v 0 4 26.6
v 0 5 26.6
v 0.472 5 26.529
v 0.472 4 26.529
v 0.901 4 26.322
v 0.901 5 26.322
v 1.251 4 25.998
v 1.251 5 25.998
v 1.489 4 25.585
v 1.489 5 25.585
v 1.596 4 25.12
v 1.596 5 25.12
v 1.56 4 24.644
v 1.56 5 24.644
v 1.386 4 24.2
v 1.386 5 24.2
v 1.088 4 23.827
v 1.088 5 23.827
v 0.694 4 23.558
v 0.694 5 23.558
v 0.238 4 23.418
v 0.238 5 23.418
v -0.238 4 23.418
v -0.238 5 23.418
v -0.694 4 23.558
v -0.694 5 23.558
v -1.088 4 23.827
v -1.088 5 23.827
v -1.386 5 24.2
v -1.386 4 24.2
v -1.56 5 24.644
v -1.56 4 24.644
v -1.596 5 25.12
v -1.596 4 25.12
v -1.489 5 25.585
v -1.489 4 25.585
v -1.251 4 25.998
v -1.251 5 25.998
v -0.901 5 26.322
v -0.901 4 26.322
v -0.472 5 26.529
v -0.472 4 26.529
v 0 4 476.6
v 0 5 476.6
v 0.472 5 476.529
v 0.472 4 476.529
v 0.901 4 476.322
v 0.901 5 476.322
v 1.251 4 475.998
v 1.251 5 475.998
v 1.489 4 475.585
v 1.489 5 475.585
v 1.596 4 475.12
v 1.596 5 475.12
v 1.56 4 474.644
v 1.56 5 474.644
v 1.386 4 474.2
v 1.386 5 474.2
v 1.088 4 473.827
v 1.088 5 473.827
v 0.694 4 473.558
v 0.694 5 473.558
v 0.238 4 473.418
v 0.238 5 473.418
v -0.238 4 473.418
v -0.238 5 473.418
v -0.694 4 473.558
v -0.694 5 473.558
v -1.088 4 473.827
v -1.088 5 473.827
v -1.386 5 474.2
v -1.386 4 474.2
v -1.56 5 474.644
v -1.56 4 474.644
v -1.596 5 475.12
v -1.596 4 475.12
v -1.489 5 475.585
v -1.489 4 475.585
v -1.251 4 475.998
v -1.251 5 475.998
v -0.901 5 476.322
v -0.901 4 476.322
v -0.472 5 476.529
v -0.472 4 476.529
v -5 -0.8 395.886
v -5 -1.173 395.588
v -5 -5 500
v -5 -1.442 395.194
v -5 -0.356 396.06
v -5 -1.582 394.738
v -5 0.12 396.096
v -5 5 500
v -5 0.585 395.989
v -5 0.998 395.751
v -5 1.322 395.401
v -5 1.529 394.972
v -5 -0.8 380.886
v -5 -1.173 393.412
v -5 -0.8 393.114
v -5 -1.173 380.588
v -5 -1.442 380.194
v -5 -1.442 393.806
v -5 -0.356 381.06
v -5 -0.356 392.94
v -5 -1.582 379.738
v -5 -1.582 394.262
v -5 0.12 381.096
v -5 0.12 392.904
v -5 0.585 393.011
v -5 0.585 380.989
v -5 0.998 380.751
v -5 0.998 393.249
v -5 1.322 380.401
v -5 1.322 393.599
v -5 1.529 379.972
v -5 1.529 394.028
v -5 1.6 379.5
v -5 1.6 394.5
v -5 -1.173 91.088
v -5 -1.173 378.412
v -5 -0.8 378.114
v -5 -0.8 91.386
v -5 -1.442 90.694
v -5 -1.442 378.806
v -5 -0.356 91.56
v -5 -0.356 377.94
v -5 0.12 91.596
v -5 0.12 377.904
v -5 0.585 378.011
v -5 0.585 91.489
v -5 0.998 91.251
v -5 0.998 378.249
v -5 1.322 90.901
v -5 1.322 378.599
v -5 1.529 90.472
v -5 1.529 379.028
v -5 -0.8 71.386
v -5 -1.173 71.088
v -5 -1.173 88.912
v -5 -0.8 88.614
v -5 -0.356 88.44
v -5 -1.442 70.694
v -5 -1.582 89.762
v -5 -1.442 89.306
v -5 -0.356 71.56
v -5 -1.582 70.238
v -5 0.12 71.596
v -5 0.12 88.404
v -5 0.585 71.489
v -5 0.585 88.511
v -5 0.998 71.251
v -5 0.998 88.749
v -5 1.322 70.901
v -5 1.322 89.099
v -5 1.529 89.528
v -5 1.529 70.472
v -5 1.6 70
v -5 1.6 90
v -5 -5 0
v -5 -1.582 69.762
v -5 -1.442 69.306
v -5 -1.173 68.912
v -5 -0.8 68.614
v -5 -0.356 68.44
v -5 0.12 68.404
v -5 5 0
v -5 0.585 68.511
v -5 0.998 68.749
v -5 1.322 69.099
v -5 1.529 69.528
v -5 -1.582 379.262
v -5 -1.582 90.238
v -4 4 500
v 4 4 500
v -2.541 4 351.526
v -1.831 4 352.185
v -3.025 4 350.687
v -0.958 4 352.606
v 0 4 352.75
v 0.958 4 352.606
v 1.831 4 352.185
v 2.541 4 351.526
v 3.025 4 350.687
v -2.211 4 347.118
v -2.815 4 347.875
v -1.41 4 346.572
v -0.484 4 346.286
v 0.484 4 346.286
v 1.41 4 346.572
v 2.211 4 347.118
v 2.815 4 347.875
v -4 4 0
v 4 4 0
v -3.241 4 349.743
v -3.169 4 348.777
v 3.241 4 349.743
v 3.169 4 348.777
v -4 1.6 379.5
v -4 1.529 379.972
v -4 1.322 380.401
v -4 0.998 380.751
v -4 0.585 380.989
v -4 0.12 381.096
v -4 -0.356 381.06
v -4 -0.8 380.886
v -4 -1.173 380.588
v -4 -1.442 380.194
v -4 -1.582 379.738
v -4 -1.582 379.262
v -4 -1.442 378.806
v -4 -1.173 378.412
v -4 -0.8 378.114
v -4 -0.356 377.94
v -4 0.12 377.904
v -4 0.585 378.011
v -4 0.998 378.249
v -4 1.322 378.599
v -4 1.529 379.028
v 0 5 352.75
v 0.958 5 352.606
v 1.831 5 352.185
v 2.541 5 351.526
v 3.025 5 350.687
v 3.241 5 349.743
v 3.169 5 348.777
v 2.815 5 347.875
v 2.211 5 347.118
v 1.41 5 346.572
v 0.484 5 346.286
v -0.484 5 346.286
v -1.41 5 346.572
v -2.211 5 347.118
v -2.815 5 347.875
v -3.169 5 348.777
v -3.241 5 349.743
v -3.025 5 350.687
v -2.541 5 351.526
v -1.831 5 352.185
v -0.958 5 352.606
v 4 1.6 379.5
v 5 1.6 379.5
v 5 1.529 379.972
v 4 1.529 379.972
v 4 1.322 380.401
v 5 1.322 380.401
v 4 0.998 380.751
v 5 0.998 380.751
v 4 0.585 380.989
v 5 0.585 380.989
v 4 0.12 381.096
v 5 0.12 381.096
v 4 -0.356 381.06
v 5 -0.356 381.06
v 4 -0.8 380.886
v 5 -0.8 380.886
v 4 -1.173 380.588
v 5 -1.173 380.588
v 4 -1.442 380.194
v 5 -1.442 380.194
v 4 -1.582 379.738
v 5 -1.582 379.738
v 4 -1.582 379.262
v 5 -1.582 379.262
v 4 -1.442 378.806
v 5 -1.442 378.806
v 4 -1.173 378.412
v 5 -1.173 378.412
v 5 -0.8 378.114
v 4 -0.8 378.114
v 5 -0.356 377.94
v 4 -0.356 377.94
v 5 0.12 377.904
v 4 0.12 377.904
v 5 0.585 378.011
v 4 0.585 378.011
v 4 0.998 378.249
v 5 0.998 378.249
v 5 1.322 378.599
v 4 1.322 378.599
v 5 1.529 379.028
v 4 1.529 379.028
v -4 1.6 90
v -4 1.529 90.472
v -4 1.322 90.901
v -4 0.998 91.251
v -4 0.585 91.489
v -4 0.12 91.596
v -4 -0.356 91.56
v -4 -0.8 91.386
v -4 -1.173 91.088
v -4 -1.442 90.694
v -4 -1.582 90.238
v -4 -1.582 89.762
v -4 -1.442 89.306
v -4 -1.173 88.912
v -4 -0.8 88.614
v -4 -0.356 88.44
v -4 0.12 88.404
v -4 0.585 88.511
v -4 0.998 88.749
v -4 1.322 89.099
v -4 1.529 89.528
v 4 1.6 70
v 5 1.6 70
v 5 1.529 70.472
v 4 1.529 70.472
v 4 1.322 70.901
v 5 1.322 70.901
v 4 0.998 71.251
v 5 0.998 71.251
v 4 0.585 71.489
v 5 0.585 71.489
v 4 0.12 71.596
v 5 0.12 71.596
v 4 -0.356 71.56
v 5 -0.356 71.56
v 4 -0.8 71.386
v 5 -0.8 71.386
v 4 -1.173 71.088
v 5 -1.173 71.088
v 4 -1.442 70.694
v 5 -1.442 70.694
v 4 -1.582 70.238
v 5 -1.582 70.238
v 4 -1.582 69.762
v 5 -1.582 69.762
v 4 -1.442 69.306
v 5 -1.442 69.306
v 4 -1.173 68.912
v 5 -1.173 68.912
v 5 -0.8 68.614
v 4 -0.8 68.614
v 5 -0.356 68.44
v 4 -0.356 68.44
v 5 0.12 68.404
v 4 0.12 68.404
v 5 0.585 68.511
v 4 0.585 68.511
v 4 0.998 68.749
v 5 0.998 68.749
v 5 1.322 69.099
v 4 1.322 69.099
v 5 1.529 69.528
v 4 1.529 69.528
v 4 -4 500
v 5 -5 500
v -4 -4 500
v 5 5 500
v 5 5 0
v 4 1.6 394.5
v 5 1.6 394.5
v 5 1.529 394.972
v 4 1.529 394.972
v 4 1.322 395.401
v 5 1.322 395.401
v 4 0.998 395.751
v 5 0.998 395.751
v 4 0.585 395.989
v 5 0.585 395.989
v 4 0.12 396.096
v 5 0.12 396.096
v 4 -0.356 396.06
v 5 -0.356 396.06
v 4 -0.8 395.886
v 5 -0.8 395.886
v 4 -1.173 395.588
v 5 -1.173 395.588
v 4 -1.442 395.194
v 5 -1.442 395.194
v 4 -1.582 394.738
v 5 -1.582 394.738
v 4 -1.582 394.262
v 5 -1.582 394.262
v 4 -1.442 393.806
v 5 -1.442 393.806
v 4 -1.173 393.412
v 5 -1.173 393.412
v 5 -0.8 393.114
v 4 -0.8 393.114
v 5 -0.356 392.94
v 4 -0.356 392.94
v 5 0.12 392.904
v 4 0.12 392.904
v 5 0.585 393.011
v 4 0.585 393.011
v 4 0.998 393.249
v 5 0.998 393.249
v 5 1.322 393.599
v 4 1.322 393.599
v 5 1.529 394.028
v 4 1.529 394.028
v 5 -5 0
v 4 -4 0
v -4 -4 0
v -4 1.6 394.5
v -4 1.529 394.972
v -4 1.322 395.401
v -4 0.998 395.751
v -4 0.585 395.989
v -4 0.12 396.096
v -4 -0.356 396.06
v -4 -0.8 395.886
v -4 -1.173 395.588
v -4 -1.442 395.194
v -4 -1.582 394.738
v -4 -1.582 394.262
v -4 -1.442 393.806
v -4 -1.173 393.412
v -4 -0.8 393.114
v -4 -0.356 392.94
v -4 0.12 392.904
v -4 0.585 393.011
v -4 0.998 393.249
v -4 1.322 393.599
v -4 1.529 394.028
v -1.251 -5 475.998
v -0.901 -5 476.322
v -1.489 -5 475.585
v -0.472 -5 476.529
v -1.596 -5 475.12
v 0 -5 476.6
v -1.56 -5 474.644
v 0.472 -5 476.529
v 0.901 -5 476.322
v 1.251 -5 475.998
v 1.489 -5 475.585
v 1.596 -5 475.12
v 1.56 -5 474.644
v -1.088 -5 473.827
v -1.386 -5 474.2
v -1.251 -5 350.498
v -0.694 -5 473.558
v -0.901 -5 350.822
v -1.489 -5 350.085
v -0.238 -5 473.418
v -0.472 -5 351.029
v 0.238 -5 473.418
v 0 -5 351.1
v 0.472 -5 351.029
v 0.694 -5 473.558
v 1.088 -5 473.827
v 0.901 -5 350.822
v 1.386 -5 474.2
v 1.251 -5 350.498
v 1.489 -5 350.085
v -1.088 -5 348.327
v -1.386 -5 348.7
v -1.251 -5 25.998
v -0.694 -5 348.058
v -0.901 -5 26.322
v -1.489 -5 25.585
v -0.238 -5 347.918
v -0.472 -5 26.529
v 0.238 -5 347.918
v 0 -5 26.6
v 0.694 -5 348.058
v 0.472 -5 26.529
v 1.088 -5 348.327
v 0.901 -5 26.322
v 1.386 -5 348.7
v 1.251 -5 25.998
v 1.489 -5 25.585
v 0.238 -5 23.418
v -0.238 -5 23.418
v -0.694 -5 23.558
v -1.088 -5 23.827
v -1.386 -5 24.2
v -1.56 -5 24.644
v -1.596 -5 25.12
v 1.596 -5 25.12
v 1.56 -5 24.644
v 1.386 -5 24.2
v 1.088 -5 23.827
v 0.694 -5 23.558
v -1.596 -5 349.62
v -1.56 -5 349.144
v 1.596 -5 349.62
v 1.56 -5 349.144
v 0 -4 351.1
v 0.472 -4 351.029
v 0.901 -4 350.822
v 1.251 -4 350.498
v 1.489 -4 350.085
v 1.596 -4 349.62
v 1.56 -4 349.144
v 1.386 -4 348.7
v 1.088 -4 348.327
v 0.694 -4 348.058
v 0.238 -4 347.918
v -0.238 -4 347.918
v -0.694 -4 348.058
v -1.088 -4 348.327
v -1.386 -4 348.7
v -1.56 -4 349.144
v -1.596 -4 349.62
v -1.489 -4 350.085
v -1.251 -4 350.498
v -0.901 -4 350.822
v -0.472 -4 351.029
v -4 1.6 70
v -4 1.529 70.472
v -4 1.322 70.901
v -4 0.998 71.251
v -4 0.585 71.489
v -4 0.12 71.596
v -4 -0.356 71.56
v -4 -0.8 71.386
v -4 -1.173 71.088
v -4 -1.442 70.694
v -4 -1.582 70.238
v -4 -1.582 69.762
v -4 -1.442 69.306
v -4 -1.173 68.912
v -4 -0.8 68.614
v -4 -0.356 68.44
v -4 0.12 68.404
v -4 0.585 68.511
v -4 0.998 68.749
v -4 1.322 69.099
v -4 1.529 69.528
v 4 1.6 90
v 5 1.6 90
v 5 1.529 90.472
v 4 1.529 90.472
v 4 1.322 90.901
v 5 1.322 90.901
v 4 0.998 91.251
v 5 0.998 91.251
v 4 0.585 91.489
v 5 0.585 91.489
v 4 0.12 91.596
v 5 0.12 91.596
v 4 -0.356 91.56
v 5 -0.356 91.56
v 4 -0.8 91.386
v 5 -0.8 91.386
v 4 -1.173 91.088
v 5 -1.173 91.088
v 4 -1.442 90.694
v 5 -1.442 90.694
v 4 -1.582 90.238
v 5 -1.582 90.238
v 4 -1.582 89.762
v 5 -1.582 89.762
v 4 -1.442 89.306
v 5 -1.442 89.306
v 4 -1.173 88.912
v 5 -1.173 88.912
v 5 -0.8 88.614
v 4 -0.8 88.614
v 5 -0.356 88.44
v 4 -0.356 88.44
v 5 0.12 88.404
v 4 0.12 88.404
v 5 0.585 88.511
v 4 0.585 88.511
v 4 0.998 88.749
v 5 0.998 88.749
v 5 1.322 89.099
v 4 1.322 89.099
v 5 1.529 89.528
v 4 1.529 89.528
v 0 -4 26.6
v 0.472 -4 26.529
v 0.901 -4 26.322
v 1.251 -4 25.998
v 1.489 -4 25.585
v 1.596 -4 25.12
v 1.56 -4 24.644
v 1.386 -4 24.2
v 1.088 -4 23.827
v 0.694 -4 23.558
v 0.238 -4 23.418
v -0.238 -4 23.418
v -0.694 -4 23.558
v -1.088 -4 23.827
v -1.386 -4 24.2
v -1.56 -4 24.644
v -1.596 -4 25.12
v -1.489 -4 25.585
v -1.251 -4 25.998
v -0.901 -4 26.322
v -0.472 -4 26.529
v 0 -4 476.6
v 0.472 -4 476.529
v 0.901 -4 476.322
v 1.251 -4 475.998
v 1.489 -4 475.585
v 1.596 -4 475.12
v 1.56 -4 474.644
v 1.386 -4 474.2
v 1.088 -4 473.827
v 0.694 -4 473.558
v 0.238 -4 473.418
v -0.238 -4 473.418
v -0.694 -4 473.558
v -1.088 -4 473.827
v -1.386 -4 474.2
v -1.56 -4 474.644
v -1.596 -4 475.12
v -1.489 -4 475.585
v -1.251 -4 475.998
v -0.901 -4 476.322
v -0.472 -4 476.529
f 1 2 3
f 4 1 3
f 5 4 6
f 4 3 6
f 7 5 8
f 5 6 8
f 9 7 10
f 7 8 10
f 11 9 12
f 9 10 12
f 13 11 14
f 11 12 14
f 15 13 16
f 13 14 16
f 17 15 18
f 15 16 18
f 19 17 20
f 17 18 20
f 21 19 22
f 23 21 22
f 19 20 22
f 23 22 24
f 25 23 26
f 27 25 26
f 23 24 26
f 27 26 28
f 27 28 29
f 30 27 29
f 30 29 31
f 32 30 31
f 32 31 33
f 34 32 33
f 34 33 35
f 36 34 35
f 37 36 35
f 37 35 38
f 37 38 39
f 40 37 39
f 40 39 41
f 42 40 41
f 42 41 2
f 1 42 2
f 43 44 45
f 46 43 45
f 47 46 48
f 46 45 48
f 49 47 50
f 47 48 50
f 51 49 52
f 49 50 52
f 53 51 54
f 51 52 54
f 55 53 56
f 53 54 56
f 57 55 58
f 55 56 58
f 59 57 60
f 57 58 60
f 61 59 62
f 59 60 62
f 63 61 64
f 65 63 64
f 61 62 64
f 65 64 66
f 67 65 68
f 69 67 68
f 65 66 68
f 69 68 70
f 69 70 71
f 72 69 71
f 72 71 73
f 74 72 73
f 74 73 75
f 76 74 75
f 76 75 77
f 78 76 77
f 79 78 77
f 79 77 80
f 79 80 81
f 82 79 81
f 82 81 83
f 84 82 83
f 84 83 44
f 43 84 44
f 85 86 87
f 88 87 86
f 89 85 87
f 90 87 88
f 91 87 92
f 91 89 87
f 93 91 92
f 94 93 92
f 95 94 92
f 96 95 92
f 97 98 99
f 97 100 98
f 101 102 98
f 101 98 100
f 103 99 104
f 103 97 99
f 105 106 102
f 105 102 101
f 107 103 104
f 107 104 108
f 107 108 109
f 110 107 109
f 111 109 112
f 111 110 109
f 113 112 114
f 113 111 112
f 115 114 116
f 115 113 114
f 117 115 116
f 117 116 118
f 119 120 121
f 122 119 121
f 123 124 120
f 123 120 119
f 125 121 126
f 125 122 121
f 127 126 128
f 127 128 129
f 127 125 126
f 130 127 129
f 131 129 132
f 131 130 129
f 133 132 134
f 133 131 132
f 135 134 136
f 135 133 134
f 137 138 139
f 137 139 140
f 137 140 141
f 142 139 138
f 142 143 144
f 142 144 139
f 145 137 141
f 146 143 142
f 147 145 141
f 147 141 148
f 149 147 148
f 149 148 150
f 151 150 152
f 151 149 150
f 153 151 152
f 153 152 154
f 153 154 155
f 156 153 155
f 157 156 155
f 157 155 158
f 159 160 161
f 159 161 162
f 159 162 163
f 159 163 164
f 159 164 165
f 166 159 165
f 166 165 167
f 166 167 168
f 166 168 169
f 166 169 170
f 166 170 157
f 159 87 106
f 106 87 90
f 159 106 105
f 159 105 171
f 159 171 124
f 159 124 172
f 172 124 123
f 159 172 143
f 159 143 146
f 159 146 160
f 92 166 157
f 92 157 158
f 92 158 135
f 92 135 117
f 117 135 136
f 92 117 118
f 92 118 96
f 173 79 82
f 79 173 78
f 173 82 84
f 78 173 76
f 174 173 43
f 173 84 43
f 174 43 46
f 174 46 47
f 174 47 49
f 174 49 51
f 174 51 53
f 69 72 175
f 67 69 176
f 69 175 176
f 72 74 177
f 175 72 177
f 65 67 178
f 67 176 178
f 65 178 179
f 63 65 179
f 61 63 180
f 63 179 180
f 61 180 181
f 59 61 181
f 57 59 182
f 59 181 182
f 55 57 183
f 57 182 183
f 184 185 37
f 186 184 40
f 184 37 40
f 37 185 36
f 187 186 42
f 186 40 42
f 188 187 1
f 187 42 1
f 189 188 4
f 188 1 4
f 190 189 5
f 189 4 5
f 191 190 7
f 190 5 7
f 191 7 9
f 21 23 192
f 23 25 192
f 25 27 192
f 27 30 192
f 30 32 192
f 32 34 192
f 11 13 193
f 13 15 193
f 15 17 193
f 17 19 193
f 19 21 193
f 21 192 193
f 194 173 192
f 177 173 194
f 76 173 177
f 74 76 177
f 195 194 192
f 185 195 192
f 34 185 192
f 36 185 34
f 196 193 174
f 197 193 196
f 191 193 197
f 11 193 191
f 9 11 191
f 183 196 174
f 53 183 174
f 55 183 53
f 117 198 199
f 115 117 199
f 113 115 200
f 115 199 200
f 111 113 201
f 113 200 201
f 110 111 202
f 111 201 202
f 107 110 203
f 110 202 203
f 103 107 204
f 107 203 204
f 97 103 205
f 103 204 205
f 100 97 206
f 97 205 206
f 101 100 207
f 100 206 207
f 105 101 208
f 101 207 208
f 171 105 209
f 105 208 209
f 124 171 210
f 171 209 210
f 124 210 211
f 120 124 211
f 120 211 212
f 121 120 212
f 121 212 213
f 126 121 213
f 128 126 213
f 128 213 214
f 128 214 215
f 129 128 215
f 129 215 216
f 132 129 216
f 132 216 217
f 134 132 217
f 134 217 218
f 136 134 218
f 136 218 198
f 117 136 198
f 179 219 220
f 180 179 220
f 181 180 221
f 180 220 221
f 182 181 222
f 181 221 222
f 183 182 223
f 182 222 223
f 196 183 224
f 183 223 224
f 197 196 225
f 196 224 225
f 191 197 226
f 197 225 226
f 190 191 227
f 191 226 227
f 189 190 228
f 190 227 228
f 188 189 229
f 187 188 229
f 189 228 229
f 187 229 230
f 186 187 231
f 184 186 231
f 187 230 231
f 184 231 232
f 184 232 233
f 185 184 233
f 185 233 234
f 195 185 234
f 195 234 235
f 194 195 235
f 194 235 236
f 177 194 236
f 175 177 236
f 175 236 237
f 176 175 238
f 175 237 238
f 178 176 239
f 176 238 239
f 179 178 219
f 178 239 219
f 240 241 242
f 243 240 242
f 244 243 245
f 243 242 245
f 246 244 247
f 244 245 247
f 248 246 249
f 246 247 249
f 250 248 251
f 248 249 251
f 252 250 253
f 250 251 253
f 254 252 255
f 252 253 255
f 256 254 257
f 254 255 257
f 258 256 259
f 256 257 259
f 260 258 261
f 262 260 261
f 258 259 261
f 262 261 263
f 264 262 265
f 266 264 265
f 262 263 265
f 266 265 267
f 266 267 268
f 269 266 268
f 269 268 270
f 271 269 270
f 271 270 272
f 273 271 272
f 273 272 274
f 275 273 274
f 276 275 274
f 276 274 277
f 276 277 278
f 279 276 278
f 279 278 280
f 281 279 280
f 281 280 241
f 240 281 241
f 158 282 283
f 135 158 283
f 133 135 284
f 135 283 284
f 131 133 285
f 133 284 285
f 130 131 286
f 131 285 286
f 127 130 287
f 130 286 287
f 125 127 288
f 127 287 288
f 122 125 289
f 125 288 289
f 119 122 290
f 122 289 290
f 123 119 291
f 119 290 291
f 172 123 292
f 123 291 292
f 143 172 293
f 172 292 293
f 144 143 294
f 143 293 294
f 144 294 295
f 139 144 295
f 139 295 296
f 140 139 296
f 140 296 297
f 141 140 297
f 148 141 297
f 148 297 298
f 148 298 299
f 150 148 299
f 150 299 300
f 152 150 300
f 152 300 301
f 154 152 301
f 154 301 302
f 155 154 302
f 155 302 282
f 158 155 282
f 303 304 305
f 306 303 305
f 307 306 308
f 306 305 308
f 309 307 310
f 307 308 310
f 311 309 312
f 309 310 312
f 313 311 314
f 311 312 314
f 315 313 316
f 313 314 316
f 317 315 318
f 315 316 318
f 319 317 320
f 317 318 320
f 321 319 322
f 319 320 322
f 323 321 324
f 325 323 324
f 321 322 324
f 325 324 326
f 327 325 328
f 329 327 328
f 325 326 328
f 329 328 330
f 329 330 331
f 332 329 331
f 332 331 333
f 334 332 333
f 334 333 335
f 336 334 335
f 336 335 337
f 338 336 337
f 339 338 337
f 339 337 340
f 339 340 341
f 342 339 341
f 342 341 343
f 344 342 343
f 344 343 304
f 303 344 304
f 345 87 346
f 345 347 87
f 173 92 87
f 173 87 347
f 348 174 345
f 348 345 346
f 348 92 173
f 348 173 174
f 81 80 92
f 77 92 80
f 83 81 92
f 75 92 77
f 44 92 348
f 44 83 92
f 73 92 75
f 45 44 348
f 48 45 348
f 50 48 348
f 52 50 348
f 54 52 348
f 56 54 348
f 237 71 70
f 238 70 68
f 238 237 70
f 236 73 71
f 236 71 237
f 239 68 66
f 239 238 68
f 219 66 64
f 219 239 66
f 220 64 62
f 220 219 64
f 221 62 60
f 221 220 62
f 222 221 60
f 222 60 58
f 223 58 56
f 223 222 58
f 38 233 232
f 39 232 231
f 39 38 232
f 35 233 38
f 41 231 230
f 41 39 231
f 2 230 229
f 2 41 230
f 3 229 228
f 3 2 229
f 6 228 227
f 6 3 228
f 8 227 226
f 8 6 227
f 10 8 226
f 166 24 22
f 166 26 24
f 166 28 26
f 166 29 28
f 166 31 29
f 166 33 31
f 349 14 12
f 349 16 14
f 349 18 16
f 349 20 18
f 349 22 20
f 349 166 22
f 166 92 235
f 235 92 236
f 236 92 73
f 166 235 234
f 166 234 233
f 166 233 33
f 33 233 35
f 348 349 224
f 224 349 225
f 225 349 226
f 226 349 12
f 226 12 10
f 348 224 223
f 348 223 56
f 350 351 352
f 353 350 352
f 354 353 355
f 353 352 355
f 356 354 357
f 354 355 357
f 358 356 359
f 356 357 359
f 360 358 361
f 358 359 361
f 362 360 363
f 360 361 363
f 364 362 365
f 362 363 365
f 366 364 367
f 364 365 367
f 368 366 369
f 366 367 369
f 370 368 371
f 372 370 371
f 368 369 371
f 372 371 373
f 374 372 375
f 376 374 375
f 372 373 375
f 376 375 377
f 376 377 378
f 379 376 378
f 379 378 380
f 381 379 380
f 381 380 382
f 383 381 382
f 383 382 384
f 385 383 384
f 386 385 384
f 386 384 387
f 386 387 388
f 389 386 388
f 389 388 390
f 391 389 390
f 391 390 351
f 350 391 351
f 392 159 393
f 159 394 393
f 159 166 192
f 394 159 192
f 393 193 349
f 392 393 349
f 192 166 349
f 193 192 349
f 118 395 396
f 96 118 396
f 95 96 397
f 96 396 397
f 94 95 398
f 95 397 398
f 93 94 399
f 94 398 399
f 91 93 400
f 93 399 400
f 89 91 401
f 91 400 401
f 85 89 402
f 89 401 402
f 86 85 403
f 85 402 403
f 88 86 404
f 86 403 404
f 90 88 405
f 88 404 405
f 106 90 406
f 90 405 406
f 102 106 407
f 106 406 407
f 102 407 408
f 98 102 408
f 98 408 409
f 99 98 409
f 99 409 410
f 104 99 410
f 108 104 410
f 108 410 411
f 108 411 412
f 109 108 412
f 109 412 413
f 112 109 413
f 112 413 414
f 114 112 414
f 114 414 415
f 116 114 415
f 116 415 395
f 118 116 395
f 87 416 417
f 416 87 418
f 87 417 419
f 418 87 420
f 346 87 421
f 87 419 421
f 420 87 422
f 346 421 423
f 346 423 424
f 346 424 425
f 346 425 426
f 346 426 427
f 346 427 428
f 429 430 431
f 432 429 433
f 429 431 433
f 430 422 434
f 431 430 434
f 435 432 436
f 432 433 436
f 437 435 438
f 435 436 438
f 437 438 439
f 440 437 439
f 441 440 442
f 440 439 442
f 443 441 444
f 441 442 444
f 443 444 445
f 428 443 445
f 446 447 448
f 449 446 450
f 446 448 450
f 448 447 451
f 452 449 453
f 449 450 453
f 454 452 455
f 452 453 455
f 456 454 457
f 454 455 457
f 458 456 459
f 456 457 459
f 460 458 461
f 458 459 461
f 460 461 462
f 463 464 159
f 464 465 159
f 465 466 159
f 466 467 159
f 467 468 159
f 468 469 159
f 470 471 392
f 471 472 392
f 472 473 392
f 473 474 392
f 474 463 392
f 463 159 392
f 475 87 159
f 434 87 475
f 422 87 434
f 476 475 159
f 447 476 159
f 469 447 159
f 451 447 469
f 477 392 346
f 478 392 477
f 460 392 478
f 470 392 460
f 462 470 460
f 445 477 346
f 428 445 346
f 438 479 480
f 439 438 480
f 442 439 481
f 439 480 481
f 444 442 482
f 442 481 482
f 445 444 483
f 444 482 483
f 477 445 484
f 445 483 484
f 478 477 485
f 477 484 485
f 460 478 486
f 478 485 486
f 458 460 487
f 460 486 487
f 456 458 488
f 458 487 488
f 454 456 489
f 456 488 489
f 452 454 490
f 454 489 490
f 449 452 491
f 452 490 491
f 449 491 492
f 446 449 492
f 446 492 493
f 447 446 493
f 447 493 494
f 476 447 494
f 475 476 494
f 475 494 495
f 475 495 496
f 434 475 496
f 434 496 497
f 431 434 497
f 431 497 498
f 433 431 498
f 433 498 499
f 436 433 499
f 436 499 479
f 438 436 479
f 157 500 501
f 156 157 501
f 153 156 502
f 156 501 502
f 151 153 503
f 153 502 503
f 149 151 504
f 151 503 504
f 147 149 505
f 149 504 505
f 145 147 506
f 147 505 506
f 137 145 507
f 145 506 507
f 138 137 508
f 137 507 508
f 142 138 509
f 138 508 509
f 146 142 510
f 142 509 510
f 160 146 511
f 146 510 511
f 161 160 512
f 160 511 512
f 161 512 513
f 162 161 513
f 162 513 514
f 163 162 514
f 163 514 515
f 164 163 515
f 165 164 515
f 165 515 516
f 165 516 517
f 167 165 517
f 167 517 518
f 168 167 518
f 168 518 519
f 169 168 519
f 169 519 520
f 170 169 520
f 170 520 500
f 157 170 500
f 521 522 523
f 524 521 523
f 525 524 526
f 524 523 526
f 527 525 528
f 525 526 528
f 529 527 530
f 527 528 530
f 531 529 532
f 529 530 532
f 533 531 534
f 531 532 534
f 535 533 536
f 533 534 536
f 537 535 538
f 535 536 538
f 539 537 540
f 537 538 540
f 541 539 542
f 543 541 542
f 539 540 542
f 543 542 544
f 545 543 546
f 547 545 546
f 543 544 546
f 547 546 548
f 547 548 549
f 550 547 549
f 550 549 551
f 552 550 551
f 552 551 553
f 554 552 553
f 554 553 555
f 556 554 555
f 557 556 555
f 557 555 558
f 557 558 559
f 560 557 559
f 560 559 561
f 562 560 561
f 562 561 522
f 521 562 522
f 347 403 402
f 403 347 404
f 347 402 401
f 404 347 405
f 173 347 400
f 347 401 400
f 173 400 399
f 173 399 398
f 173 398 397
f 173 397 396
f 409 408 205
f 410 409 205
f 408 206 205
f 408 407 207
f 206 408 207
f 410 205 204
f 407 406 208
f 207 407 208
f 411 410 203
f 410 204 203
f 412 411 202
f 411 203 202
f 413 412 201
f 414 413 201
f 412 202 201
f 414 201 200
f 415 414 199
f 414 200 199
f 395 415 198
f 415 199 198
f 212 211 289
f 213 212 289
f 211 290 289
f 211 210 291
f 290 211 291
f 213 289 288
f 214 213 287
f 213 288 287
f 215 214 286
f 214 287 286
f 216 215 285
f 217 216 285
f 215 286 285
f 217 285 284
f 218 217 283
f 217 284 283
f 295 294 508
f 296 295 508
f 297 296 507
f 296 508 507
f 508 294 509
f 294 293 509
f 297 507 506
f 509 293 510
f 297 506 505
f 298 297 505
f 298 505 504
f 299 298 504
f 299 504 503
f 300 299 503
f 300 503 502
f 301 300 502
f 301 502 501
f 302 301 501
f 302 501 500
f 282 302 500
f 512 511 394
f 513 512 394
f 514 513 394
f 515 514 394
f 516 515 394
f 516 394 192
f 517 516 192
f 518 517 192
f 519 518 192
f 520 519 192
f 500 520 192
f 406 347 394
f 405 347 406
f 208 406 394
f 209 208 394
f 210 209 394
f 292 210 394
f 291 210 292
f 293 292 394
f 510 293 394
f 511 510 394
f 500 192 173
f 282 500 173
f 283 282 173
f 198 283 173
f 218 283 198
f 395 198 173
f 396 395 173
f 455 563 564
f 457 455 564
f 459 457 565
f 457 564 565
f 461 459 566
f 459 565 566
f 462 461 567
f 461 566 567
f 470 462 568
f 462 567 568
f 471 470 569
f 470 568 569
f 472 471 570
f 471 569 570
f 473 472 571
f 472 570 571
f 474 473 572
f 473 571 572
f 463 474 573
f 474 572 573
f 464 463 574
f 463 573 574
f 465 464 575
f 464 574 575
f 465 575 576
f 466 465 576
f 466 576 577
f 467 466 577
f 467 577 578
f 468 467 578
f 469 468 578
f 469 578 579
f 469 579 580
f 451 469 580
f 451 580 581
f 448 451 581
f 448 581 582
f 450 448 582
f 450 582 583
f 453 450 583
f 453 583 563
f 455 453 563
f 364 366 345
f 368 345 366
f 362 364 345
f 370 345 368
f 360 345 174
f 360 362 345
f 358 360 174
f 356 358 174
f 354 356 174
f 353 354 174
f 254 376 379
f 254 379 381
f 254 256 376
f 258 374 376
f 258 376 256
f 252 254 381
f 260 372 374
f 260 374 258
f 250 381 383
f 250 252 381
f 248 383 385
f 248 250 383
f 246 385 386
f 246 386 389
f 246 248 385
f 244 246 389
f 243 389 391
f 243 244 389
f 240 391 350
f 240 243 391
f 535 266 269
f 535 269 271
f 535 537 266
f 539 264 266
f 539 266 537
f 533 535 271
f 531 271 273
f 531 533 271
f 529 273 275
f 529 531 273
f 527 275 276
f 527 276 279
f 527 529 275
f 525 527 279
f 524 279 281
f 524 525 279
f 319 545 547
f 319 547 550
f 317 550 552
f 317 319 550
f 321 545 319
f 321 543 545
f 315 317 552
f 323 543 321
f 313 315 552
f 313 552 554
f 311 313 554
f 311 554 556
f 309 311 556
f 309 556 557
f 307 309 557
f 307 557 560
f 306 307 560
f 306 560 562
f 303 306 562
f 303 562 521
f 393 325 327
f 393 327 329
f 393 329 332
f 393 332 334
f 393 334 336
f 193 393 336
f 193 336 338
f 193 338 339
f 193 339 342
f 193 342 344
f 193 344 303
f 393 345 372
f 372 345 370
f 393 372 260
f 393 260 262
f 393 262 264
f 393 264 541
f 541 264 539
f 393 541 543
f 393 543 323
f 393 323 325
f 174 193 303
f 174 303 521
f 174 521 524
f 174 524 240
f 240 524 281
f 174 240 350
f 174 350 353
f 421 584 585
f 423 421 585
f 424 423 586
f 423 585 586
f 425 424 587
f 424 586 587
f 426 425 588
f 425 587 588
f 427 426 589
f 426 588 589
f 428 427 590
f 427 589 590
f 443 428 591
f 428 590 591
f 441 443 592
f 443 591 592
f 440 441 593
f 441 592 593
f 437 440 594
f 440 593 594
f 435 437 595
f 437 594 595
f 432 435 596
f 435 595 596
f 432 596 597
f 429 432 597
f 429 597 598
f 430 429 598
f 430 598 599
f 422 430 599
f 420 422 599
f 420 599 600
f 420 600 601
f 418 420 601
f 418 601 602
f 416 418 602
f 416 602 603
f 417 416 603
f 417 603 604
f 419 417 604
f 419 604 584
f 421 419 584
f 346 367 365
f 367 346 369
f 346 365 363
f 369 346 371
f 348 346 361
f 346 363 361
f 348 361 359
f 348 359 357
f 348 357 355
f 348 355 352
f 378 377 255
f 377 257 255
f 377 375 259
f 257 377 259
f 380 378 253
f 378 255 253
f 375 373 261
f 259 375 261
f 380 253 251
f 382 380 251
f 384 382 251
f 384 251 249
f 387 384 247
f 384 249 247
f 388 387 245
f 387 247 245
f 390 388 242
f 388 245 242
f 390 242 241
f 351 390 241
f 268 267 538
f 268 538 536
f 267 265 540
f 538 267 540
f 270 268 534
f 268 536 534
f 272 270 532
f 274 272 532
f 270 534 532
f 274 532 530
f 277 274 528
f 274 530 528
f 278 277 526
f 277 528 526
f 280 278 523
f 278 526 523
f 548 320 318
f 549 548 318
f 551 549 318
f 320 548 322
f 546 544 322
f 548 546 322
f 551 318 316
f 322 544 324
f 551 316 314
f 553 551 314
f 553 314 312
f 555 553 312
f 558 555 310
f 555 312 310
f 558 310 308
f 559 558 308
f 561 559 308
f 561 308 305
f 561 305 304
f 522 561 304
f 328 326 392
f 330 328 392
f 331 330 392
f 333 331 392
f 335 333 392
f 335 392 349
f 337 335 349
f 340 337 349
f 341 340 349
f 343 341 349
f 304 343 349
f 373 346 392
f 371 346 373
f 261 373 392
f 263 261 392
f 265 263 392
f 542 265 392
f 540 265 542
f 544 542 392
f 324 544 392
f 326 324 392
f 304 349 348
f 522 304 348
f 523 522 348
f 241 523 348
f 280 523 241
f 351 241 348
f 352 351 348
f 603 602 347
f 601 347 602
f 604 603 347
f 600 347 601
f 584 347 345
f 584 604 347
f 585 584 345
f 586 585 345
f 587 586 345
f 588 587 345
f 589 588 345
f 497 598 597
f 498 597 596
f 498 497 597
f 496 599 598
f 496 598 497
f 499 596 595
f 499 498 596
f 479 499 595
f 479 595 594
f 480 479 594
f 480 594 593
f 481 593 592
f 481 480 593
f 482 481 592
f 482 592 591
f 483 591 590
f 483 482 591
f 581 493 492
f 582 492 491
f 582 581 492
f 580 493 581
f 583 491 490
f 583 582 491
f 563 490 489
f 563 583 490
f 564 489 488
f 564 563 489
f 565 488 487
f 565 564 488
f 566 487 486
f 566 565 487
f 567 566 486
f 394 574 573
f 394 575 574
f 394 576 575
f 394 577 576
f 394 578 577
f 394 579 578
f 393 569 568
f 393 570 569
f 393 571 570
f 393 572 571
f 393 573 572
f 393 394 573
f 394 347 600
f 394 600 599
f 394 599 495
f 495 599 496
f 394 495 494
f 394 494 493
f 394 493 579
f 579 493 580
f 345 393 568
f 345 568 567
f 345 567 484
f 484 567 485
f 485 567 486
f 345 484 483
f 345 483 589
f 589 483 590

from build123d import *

# Parameters (mm, degrees)
SKETCH1_W           = 10
SKETCH1_H           = 10
SKETCH1_W_2         = 8
SKETCH1_H_2         = 8
BOSS_EXTRUDE1_DEPTH = 500
CUT_EXTRUDE1_REACH  = 502.125
SKETCH2_R           = 1.6
CUT_EXTRUDE2_REACH  = 502.125
SKETCH3_R           = 1.6
SKETCH4_R           = 1.6
CUT_EXTRUDE3_DEPTH  = 10
SKETCH5_R           = 3.25
CUT_EXTRUDE4_DEPTH  = 1


with BuildPart() as part:
    # Sketch1 → Boss-Extrude1 (new body)
    with BuildSketch(Plane.XY):
        Rectangle(SKETCH1_W, SKETCH1_H)
        Rectangle(SKETCH1_W_2, SKETCH1_H_2, mode=Mode.SUBTRACT)
    extrude(amount=BOSS_EXTRUDE1_DEPTH)

    # Cut-Extrude1: up to this face of the body (flat: up to its plane)
    cut_extrude1_end = Plane(part.part.faces().sort_by_distance((0, -5, 250))[0])
    # Sketch2 → Cut-Extrude1 (cut, up to the picked face)
    with BuildSketch(Plane(origin=(0, 5, 0), x_dir=(1, 0, 0), z_dir=(0, 1, 0)), mode=Mode.PRIVATE) as cut_extrude1_sk1:
        with Locations(Location((0, -349.5, 0), (0, 0, 270))):
            Circle(SKETCH2_R)
    cut_extrude1_tool1 = split(extrude(cut_extrude1_sk1.sketch, amount=-CUT_EXTRUDE1_REACH, mode=Mode.PRIVATE), bisect_by=cut_extrude1_end, keep=Keep.BOTH, mode=Mode.PRIVATE)
    add(cut_extrude1_tool1.solids().sort_by(Axis((0, 5, 349.5), (0, -1, 0)))[0], mode=Mode.SUBTRACT)

    # Cut-Extrude2: up to this face of the body (flat: up to its plane)
    cut_extrude2_end = Plane(part.part.faces().sort_by_distance((0, -5, 249.839696857))[0])
    # Sketch3 → Cut-Extrude2 (cut, up to the picked face)
    with BuildSketch(Plane(origin=(0, 5, 0), x_dir=(1, 0, 0), z_dir=(0, 1, 0)), mode=Mode.PRIVATE) as cut_extrude2_sk1:
        with Locations(Location((0, -475, 0), (0, 0, 270))):
            Circle(SKETCH3_R)
    cut_extrude2_tool1 = split(extrude(cut_extrude2_sk1.sketch, amount=-CUT_EXTRUDE2_REACH, mode=Mode.PRIVATE), bisect_by=cut_extrude2_end, keep=Keep.BOTH, mode=Mode.PRIVATE)
    # Sketch3 → Cut-Extrude2 (cut, up to the picked face)
    with BuildSketch(Plane(origin=(0, 5, 0), x_dir=(1, 0, 0), z_dir=(0, 1, 0)), mode=Mode.PRIVATE) as cut_extrude2_sk2:
        with Locations(Location((0, -25, 0), (0, 0, 270))):
            Circle(SKETCH3_R)
    cut_extrude2_tool2 = split(extrude(cut_extrude2_sk2.sketch, amount=-CUT_EXTRUDE2_REACH, mode=Mode.PRIVATE), bisect_by=cut_extrude2_end, keep=Keep.BOTH, mode=Mode.PRIVATE)
    add(cut_extrude2_tool1.solids().sort_by(Axis((0, 5, 475), (0, -1, 0)))[0], mode=Mode.SUBTRACT)
    add(cut_extrude2_tool2.solids().sort_by(Axis((0, 5, 25), (0, -1, 0)))[0], mode=Mode.SUBTRACT)

    # Sketch4 → Cut-Extrude3 (cut)
    with BuildSketch(Plane(origin=(5, 0, 0), x_dir=(0, 0, -1), z_dir=(1, 0, 0))):
        with Locations(Location((-70, 0, 0), (0, 0, 90))):
            Circle(SKETCH4_R)
        with Locations(Location((-90, 0, 0), (0, 0, 90))):
            Circle(SKETCH4_R)
        with Locations(Location((-394.5, 0, 0), (0, 0, 90))):
            Circle(SKETCH4_R)
        with Locations(Location((-379.5, 0, 0), (0, 0, 90))):
            Circle(SKETCH4_R)
    extrude(amount=-CUT_EXTRUDE3_DEPTH, mode=Mode.SUBTRACT)

    # Sketch5 → Cut-Extrude4 (cut)
    with BuildSketch(Plane(origin=(0, 5, 0), x_dir=(1, 0, 0), z_dir=(0, 1, 0))):
        with Locations(Location((0, -349.5, 0), (0, 0, 270))):
            Circle(SKETCH5_R)
    extrude(amount=-CUT_EXTRUDE4_DEPTH, mode=Mode.SUBTRACT)


solid = part.part
